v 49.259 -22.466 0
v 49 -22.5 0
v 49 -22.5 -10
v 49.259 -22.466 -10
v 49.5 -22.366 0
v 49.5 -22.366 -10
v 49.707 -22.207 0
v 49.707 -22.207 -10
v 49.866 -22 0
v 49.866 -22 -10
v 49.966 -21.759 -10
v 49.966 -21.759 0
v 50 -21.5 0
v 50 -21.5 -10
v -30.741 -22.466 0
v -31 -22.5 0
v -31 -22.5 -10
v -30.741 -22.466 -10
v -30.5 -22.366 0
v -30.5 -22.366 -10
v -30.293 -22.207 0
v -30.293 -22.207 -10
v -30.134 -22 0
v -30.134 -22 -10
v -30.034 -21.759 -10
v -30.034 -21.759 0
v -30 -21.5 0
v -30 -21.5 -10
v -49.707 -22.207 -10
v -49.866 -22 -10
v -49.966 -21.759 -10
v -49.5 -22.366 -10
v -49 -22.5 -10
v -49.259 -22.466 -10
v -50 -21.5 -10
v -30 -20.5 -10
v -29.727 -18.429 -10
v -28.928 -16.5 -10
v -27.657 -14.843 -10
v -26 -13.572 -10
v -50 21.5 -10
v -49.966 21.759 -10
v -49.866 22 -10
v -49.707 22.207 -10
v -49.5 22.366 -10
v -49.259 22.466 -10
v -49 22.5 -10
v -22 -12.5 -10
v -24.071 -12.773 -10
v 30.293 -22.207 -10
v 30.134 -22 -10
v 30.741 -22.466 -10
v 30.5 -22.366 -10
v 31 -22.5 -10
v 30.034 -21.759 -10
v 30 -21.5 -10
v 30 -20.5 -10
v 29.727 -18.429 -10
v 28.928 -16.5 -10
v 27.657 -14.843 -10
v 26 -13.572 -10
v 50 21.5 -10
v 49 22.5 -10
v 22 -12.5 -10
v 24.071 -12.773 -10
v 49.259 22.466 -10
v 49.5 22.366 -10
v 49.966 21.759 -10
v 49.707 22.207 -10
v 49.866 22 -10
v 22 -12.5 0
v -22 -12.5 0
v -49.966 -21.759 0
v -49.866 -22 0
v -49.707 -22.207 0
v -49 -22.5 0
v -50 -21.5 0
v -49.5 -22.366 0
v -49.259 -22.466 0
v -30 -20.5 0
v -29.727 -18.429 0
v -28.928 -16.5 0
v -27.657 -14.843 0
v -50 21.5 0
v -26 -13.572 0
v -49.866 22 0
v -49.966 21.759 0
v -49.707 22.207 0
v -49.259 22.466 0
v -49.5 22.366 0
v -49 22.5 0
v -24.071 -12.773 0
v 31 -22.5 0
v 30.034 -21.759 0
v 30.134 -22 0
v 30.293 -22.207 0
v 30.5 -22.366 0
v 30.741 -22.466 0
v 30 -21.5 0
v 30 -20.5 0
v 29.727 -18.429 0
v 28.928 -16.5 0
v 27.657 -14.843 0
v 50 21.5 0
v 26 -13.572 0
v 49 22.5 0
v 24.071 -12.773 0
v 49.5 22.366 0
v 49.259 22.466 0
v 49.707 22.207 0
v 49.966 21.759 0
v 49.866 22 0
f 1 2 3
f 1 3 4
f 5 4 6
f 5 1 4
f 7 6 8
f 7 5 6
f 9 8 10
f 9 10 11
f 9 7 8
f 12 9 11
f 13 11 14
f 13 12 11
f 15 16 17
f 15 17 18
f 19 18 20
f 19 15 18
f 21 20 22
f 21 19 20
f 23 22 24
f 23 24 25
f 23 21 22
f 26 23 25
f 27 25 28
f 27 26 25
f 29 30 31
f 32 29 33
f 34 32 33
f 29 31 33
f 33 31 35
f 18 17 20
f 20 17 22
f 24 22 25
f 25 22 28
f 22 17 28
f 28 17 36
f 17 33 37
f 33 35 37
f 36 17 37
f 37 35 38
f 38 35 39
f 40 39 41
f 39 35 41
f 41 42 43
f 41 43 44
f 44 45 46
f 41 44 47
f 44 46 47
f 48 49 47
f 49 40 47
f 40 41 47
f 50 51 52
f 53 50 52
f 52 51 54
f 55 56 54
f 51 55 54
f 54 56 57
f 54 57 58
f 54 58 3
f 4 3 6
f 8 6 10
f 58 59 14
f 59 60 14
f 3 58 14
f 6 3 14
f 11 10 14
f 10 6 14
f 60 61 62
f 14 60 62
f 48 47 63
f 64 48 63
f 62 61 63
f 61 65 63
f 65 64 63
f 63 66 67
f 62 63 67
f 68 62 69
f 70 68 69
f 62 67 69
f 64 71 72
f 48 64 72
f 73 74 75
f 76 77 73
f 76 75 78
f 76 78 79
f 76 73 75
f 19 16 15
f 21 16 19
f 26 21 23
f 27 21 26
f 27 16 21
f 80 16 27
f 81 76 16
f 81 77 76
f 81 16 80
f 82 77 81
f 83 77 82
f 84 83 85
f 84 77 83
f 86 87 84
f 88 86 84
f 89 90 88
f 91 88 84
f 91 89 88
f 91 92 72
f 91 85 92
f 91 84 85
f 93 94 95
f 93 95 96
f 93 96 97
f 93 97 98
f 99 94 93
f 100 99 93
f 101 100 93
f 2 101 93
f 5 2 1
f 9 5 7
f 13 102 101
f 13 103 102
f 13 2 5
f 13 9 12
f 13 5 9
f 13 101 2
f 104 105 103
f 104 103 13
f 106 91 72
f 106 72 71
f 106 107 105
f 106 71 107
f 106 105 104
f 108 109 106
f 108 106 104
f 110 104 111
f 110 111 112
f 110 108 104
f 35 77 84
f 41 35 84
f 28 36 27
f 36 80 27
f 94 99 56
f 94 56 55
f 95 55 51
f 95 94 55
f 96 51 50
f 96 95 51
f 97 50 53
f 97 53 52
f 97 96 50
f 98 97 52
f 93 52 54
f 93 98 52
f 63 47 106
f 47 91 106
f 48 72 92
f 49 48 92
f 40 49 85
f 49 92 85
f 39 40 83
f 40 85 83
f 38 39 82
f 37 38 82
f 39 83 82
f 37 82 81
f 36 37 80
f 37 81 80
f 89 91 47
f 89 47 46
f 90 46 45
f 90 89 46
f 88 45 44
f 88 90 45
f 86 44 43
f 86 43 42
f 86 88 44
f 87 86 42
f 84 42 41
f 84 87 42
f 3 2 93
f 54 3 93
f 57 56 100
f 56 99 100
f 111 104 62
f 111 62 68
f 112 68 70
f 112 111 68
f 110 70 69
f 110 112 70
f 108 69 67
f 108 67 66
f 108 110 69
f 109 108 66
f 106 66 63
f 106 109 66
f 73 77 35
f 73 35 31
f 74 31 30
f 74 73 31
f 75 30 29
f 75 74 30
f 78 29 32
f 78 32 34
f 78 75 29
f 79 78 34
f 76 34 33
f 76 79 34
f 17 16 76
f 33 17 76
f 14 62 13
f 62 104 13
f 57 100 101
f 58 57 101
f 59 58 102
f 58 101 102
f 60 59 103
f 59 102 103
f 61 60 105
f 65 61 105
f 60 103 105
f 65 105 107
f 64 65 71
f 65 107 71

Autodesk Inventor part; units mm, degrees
ref_plane "YZ Plane" through (0, 0, 0) normal (1, 0, 0) x (0, 1, 0)
ref_plane "XZ Plane" through (0, 0, 0) normal (0, 1, 0) x (-1, 0, 0)
ref_plane "XY Plane" through (0, 0, 0) normal (0, 0, 1) x (1, 0, 0)
sketch "Sketch1" plane through (0, 0, 0) normal (0, 0, 1) x (1, 0, 0)
  line L0 (0, 31.7899) -> (0, -31.7899) projected
  line L1 (-70.2899, 0) -> (70.2899, 0) projected
  line L2 (-49, 22.5) -> (49, 22.5)
  line L3 (50, 21.5) -> (50, -21.5)
  line L4 (-50, -21.5) -> (-50, 21.5)
  line L5 (30, -21.5) -> (30, -20.5)
  line L6 (22, -12.5) -> (-22, -12.5)
  line L7 (-30, -20.5) -> (-30, -21.5)
  arc A0 (-22, -12.5) -> (-30, -20.5) centre (-22, -20.5) ccw
  arc A1 (30, -20.5) -> (22, -12.5) centre (22, -20.5) ccw
  line L8 (49, -22.5) -> (31, -22.5)
  line L9 (-31, -22.5) -> (-49, -22.5)
  arc A2 (-49, 22.5) -> (-50, 21.5) centre (-49, 21.5) ccw
  arc A3 (50, 21.5) -> (49, 22.5) centre (49, 21.5) ccw
  arc A4 (49, -22.5) -> (50, -21.5) centre (49, -21.5) ccw
  arc A5 (30, -21.5) -> (31, -22.5) centre (31, -21.5) ccw
  arc A6 (-31, -22.5) -> (-30, -21.5) centre (-31, -21.5) ccw
  arc A7 (-50, -21.5) -> (-49, -22.5) centre (-49, -21.5) ccw
  point P0 (0, 0)
  point P1 (-50, 22.5)
  point P2 (50, 22.5)
  point P3 (-50, -22.5)
  dimension "d0" = 100
  dimension "d1" = 45
  dimension "d2" = 20
  dimension "d4" = 8
  dimension "d5" = 1
  dimension "d6" = 1
extrude "Extrusion1" add sketch "Sketch1" against normal blind 10
properties part number "SlipersLåda 211018008"
